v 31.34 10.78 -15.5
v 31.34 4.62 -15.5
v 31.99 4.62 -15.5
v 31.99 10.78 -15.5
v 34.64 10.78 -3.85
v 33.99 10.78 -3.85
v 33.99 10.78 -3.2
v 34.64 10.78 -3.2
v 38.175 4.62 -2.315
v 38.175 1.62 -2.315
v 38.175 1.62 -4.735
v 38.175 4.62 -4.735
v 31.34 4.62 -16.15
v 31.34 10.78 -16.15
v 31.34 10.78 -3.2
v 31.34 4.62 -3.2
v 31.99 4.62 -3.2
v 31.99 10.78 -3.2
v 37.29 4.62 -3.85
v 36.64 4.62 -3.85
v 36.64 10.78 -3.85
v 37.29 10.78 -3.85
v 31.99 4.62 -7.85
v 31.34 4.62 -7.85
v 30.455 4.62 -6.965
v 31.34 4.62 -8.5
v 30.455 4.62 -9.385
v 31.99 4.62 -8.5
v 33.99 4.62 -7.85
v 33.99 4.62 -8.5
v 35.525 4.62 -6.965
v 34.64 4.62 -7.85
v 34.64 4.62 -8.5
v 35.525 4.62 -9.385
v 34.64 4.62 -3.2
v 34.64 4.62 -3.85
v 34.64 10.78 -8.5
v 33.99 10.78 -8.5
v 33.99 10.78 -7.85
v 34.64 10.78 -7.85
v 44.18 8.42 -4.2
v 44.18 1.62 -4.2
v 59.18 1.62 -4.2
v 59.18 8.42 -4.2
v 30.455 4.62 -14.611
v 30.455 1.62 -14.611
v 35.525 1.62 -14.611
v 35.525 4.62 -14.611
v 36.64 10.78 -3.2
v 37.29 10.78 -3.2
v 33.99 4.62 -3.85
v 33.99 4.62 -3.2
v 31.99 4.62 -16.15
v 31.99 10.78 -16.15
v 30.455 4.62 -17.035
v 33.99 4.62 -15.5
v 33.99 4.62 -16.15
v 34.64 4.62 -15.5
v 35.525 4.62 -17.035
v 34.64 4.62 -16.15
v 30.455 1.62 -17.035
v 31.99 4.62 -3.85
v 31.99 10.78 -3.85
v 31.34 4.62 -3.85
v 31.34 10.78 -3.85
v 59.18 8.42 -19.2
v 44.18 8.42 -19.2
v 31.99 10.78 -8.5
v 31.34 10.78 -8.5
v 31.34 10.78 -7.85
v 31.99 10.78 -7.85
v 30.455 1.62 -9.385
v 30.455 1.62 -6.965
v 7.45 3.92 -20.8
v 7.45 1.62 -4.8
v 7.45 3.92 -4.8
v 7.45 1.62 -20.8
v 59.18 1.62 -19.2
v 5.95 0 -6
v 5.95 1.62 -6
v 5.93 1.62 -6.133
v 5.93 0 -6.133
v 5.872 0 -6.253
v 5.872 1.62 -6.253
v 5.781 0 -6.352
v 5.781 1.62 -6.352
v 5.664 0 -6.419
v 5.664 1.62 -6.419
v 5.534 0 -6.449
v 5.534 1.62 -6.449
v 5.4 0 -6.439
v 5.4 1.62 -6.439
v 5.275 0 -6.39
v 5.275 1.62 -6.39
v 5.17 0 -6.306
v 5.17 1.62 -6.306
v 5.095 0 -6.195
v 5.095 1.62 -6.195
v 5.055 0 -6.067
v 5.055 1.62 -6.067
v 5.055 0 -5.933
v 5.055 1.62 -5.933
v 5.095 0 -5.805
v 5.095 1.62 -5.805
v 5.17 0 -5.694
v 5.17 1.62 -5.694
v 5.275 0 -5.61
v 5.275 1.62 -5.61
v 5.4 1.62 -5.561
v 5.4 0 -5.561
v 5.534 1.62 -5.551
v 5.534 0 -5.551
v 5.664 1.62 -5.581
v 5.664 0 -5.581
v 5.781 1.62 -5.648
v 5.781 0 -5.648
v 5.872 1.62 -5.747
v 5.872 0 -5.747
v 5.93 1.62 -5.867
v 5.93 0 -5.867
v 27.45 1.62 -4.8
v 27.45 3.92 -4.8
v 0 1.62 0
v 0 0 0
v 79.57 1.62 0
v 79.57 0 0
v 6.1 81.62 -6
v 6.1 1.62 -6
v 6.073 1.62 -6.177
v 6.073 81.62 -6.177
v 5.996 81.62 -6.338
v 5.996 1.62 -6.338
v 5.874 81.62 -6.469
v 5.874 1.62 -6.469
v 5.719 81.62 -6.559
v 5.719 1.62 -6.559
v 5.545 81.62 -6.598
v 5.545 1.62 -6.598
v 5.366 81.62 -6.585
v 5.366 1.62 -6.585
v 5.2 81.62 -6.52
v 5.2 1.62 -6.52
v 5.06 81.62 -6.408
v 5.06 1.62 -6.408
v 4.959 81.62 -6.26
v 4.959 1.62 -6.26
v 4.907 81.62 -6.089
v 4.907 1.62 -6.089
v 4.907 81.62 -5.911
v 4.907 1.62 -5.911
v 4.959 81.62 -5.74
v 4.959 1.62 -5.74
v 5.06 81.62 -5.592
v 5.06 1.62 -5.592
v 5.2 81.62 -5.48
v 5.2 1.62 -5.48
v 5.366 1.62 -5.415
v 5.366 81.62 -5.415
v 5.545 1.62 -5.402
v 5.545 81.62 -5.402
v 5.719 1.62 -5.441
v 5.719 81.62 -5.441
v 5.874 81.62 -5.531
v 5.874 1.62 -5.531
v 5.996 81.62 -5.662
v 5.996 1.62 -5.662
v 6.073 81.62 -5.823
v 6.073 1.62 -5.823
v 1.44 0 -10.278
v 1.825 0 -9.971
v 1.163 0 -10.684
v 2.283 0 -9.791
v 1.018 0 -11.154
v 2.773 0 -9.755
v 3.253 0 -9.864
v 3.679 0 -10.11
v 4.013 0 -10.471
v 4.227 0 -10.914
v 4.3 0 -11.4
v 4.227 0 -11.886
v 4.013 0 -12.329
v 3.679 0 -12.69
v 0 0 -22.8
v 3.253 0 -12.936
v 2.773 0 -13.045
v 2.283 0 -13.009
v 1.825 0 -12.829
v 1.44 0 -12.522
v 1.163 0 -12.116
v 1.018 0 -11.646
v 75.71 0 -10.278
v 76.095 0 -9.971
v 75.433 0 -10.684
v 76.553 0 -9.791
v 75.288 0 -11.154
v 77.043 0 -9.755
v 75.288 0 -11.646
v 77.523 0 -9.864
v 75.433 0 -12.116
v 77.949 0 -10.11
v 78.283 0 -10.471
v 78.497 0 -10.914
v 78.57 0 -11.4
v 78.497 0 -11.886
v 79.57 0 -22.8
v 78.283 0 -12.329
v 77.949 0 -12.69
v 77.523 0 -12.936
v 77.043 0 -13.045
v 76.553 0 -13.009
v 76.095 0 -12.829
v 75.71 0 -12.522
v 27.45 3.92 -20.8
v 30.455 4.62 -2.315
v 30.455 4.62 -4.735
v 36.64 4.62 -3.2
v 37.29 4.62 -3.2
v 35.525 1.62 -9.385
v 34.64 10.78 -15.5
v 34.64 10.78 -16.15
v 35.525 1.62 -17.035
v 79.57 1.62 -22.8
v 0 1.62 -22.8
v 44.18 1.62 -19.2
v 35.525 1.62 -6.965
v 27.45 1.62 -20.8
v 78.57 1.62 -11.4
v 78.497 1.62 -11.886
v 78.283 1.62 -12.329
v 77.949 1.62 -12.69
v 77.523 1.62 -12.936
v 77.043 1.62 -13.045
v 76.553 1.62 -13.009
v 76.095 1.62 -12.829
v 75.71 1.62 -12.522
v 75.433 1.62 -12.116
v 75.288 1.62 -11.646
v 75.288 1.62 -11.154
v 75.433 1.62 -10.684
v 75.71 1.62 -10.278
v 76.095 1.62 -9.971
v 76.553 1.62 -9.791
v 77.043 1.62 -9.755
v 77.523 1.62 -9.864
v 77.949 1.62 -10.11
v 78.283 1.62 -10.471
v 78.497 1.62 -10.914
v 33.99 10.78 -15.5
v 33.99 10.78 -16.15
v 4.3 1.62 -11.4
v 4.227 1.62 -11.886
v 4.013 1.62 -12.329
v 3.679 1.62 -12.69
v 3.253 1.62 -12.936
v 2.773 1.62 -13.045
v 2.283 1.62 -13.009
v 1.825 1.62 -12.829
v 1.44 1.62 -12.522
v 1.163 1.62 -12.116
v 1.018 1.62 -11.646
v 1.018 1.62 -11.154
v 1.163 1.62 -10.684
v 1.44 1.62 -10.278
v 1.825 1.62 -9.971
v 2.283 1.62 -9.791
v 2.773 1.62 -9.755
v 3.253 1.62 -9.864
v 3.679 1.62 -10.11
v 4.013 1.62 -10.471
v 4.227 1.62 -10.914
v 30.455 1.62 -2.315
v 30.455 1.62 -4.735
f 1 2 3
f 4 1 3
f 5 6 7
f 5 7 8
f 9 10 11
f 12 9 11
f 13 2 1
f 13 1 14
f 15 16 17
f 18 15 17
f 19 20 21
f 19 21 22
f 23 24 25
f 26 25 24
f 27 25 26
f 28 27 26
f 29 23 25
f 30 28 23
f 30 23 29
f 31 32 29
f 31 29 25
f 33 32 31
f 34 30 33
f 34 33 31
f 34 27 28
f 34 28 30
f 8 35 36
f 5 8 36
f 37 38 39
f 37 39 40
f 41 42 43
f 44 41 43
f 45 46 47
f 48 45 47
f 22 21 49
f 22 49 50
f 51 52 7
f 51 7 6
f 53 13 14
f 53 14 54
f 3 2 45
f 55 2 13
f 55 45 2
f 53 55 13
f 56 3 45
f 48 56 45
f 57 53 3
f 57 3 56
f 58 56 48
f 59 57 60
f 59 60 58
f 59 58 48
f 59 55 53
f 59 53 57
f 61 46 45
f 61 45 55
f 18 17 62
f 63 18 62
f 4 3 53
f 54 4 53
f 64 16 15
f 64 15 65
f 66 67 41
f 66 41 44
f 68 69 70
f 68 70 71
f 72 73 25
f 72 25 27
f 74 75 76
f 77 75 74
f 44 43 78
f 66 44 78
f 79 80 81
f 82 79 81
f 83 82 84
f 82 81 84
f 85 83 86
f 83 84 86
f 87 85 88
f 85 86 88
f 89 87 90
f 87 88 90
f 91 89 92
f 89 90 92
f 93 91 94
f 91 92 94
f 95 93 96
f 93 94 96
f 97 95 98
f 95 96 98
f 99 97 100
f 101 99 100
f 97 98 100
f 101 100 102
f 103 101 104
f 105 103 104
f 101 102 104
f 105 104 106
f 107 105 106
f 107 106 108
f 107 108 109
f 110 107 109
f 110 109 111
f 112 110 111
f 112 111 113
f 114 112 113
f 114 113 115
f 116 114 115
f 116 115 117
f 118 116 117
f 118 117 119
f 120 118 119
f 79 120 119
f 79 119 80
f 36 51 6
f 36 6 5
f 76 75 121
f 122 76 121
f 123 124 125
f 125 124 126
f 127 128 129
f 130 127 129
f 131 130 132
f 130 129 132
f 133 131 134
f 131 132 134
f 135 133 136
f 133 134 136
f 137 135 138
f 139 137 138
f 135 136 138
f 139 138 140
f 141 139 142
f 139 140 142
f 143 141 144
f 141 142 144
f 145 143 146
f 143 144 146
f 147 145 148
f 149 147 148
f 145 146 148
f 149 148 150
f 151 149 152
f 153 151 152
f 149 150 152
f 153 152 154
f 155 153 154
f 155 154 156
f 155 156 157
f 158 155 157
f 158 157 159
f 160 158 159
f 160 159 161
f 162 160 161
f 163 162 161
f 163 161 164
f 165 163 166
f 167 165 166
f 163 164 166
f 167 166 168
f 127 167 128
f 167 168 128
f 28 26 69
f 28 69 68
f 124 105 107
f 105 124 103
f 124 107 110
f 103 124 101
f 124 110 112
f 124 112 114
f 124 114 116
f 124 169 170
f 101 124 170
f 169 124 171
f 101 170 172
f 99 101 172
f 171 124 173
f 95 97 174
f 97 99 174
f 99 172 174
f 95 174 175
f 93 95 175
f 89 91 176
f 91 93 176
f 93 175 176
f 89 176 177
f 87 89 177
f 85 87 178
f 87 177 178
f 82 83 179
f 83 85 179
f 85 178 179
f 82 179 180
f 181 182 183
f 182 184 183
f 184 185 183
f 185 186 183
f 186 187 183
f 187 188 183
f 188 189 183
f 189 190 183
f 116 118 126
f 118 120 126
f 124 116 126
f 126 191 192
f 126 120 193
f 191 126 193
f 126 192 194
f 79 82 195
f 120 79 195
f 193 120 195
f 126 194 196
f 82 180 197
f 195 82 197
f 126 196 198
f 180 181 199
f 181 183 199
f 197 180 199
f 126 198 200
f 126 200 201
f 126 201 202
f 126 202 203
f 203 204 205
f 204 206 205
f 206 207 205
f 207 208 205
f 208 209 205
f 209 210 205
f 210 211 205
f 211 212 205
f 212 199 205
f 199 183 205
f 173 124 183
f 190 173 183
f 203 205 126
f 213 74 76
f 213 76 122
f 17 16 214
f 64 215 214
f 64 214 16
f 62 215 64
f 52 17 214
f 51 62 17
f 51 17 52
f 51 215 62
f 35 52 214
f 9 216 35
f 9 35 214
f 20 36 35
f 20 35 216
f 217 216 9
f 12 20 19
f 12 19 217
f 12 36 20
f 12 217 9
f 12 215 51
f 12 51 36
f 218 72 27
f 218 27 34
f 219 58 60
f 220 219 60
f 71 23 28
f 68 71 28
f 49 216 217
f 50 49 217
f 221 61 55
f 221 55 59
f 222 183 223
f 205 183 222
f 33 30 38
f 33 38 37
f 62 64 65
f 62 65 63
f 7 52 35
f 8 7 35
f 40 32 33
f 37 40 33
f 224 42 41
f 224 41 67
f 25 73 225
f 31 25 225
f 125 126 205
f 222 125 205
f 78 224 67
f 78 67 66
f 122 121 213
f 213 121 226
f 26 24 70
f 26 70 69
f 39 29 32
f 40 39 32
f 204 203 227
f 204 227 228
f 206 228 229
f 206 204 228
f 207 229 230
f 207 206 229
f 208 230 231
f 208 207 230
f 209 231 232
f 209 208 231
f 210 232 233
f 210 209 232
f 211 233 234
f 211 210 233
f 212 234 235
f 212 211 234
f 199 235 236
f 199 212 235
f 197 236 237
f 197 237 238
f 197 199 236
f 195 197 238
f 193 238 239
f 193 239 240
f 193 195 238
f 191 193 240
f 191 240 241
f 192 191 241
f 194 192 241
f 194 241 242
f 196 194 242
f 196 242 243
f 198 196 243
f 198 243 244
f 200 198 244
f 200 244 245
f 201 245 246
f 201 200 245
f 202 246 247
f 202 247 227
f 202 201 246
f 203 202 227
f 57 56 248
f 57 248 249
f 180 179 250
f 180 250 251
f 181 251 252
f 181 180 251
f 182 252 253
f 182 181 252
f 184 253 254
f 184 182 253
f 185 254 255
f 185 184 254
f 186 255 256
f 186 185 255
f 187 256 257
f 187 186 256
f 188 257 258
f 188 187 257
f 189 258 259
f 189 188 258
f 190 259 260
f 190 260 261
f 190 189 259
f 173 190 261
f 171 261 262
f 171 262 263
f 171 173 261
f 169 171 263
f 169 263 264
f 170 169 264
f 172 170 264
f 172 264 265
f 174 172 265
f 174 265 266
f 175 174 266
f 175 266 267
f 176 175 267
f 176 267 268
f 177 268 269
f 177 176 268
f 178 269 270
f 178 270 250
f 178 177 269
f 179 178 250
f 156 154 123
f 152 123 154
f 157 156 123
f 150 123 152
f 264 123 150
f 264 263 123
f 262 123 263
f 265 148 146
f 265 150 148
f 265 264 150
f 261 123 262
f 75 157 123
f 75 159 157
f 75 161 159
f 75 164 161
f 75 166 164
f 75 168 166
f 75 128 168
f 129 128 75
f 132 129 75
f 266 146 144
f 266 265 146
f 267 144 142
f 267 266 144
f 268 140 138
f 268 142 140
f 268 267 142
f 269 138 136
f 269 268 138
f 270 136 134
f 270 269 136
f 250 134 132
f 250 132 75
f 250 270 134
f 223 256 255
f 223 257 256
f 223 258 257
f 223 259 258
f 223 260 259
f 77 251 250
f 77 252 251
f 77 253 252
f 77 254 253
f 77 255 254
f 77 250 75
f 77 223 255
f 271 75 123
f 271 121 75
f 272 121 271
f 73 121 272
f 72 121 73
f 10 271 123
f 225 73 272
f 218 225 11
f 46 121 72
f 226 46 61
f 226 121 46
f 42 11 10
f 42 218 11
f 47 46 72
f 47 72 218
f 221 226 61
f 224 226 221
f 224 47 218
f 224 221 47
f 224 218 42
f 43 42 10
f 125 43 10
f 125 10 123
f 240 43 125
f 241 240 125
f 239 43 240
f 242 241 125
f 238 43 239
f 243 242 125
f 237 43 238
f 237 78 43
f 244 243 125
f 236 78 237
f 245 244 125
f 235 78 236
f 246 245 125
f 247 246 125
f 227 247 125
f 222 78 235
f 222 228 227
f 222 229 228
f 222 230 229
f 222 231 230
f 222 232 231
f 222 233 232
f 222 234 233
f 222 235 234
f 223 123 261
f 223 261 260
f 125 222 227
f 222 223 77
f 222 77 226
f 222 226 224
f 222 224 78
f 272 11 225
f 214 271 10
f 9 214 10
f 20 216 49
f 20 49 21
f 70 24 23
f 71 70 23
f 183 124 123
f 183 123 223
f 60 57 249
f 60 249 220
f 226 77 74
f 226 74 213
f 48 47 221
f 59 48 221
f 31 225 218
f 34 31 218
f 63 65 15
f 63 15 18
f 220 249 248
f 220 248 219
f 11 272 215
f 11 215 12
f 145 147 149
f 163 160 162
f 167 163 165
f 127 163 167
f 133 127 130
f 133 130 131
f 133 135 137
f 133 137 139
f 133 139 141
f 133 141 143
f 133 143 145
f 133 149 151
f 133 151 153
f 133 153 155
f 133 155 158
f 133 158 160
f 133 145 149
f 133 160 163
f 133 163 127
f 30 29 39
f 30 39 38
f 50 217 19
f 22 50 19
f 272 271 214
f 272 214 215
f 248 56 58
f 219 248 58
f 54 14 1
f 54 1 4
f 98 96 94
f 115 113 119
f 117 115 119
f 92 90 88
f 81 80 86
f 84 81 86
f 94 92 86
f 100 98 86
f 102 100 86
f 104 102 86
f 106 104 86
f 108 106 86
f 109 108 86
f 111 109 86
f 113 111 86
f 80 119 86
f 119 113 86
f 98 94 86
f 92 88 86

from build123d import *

# Parameters (mm, degrees)
SKETCH1_W              = 79.57
SKETCH1_H              = 22.8
SKETCH1_R              = 1.65
BOSS_EXTRUDE2_DEPTH    = 1.62
SKETCH2_W              = 15
SKETCH2_H              = 15
BOSS_EXTRUDE3_DEPTH    = 6.8
SKETCH3_W              = 0.65
SKETCH3_H              = 0.65
BOSS_EXTRUDE4_DEPTH    = 9.16
SKETCH4_W              = 7.72
SKETCH4_H              = 2.42
SKETCH4_W_2            = 5.07
SKETCH4_H_2            = 2.424
BOSS_EXTRUDE5_DEPTH    = 3
SKETCH5_W              = 20
SKETCH5_H              = 16
BOSS_EXTRUDE6_DEPTH    = 2.3
SKETCH6_R              = 0.45
HOLE_FOR_ANTENNA_DEPTH = 2.8
SKETCH7_R              = 0.6
BOSS_EXTRUDE7_DEPTH    = 80


with BuildPart() as part:
    # Sketch1 → Boss-Extrude2 (new body)
    with BuildSketch(Plane(origin=(0, 0, 0), x_dir=(1, 0, 0), z_dir=(0, 1, 0))):
        with Locations((39.785, 11.4)):
            Rectangle(SKETCH1_W, SKETCH1_H)
        with Locations((2.65, 11.4)):
            Circle(SKETCH1_R, mode=Mode.SUBTRACT)
        with Locations((76.92, 11.4)):
            Circle(SKETCH1_R, mode=Mode.SUBTRACT)
    extrude(amount=BOSS_EXTRUDE2_DEPTH)

    # Sketch2 → Boss-Extrude3 (add)
    with BuildSketch(Plane(origin=(0, 1.62, 0), x_dir=(1, 0, 0), z_dir=(0, 1, 0))):
        with Locations((51.68, 11.7)):
            Rectangle(SKETCH2_W, SKETCH2_H)
    extrude(amount=BOSS_EXTRUDE3_DEPTH)

    # Sketch3 → Boss-Extrude4 (add)
    with BuildSketch(Plane(origin=(0, 1.62, 0), x_dir=(1, 0, 0), z_dir=(0, 1, 0))):
        with Locations((31.665, 3.525)):
            Rectangle(SKETCH3_W, SKETCH3_H)
        with Locations((34.315, 3.525)):
            Rectangle(SKETCH3_W, SKETCH3_H)
        with Locations((36.965, 3.525)):
            Rectangle(SKETCH3_W, SKETCH3_H)
        with Locations((31.665, 8.175)):
            Rectangle(SKETCH3_W, SKETCH3_H)
        with Locations((34.315, 8.175)):
            Rectangle(SKETCH3_W, SKETCH3_H)
        with Locations((31.665, 15.825)):
            Rectangle(SKETCH3_W, SKETCH3_H)
        with Locations((34.315, 15.825)):
            Rectangle(SKETCH3_W, SKETCH3_H)
    extrude(amount=BOSS_EXTRUDE4_DEPTH)

    # Sketch4 → Boss-Extrude5 (add)
    with BuildSketch(Plane(origin=(0, 1.62, 0), x_dir=(1, 0, 0), z_dir=(0, 1, 0))):
        with Locations((34.315, 3.525)):
            Rectangle(SKETCH4_W, SKETCH4_H)
        with Locations((32.99, 8.175)):
            Rectangle(SKETCH4_W_2, SKETCH4_H)
        with Locations((32.99, 15.823)):
            Rectangle(SKETCH4_W_2, SKETCH4_H_2)
    extrude(amount=BOSS_EXTRUDE5_DEPTH)

    # Sketch5 → Boss-Extrude6 (add)
    with BuildSketch(Plane(origin=(0, 1.62, 0), x_dir=(1, 0, 0), z_dir=(0, 1, 0))):
        with Locations((17.45, 12.8)):
            Rectangle(SKETCH5_W, SKETCH5_H)
    extrude(amount=BOSS_EXTRUDE6_DEPTH)

    # Sketch6 → Hole for antenna (cut)
    with BuildSketch(Plane(origin=(0, 1.62, 0), x_dir=(1, 0, 0), z_dir=(0, 1, 0))):
        with Locations((5.5, 6)):
            Circle(SKETCH6_R)
    extrude(amount=-HOLE_FOR_ANTENNA_DEPTH, mode=Mode.SUBTRACT)

    # Sketch7 → Boss-Extrude7 (add)
    with BuildSketch(Plane(origin=(0, 1.62, 0), x_dir=(1, 0, 0), z_dir=(0, 1, 0))):
        with Locations((5.5, 6)):
            Circle(SKETCH7_R)
    extrude(amount=BOSS_EXTRUDE7_DEPTH)


solid = part.part
